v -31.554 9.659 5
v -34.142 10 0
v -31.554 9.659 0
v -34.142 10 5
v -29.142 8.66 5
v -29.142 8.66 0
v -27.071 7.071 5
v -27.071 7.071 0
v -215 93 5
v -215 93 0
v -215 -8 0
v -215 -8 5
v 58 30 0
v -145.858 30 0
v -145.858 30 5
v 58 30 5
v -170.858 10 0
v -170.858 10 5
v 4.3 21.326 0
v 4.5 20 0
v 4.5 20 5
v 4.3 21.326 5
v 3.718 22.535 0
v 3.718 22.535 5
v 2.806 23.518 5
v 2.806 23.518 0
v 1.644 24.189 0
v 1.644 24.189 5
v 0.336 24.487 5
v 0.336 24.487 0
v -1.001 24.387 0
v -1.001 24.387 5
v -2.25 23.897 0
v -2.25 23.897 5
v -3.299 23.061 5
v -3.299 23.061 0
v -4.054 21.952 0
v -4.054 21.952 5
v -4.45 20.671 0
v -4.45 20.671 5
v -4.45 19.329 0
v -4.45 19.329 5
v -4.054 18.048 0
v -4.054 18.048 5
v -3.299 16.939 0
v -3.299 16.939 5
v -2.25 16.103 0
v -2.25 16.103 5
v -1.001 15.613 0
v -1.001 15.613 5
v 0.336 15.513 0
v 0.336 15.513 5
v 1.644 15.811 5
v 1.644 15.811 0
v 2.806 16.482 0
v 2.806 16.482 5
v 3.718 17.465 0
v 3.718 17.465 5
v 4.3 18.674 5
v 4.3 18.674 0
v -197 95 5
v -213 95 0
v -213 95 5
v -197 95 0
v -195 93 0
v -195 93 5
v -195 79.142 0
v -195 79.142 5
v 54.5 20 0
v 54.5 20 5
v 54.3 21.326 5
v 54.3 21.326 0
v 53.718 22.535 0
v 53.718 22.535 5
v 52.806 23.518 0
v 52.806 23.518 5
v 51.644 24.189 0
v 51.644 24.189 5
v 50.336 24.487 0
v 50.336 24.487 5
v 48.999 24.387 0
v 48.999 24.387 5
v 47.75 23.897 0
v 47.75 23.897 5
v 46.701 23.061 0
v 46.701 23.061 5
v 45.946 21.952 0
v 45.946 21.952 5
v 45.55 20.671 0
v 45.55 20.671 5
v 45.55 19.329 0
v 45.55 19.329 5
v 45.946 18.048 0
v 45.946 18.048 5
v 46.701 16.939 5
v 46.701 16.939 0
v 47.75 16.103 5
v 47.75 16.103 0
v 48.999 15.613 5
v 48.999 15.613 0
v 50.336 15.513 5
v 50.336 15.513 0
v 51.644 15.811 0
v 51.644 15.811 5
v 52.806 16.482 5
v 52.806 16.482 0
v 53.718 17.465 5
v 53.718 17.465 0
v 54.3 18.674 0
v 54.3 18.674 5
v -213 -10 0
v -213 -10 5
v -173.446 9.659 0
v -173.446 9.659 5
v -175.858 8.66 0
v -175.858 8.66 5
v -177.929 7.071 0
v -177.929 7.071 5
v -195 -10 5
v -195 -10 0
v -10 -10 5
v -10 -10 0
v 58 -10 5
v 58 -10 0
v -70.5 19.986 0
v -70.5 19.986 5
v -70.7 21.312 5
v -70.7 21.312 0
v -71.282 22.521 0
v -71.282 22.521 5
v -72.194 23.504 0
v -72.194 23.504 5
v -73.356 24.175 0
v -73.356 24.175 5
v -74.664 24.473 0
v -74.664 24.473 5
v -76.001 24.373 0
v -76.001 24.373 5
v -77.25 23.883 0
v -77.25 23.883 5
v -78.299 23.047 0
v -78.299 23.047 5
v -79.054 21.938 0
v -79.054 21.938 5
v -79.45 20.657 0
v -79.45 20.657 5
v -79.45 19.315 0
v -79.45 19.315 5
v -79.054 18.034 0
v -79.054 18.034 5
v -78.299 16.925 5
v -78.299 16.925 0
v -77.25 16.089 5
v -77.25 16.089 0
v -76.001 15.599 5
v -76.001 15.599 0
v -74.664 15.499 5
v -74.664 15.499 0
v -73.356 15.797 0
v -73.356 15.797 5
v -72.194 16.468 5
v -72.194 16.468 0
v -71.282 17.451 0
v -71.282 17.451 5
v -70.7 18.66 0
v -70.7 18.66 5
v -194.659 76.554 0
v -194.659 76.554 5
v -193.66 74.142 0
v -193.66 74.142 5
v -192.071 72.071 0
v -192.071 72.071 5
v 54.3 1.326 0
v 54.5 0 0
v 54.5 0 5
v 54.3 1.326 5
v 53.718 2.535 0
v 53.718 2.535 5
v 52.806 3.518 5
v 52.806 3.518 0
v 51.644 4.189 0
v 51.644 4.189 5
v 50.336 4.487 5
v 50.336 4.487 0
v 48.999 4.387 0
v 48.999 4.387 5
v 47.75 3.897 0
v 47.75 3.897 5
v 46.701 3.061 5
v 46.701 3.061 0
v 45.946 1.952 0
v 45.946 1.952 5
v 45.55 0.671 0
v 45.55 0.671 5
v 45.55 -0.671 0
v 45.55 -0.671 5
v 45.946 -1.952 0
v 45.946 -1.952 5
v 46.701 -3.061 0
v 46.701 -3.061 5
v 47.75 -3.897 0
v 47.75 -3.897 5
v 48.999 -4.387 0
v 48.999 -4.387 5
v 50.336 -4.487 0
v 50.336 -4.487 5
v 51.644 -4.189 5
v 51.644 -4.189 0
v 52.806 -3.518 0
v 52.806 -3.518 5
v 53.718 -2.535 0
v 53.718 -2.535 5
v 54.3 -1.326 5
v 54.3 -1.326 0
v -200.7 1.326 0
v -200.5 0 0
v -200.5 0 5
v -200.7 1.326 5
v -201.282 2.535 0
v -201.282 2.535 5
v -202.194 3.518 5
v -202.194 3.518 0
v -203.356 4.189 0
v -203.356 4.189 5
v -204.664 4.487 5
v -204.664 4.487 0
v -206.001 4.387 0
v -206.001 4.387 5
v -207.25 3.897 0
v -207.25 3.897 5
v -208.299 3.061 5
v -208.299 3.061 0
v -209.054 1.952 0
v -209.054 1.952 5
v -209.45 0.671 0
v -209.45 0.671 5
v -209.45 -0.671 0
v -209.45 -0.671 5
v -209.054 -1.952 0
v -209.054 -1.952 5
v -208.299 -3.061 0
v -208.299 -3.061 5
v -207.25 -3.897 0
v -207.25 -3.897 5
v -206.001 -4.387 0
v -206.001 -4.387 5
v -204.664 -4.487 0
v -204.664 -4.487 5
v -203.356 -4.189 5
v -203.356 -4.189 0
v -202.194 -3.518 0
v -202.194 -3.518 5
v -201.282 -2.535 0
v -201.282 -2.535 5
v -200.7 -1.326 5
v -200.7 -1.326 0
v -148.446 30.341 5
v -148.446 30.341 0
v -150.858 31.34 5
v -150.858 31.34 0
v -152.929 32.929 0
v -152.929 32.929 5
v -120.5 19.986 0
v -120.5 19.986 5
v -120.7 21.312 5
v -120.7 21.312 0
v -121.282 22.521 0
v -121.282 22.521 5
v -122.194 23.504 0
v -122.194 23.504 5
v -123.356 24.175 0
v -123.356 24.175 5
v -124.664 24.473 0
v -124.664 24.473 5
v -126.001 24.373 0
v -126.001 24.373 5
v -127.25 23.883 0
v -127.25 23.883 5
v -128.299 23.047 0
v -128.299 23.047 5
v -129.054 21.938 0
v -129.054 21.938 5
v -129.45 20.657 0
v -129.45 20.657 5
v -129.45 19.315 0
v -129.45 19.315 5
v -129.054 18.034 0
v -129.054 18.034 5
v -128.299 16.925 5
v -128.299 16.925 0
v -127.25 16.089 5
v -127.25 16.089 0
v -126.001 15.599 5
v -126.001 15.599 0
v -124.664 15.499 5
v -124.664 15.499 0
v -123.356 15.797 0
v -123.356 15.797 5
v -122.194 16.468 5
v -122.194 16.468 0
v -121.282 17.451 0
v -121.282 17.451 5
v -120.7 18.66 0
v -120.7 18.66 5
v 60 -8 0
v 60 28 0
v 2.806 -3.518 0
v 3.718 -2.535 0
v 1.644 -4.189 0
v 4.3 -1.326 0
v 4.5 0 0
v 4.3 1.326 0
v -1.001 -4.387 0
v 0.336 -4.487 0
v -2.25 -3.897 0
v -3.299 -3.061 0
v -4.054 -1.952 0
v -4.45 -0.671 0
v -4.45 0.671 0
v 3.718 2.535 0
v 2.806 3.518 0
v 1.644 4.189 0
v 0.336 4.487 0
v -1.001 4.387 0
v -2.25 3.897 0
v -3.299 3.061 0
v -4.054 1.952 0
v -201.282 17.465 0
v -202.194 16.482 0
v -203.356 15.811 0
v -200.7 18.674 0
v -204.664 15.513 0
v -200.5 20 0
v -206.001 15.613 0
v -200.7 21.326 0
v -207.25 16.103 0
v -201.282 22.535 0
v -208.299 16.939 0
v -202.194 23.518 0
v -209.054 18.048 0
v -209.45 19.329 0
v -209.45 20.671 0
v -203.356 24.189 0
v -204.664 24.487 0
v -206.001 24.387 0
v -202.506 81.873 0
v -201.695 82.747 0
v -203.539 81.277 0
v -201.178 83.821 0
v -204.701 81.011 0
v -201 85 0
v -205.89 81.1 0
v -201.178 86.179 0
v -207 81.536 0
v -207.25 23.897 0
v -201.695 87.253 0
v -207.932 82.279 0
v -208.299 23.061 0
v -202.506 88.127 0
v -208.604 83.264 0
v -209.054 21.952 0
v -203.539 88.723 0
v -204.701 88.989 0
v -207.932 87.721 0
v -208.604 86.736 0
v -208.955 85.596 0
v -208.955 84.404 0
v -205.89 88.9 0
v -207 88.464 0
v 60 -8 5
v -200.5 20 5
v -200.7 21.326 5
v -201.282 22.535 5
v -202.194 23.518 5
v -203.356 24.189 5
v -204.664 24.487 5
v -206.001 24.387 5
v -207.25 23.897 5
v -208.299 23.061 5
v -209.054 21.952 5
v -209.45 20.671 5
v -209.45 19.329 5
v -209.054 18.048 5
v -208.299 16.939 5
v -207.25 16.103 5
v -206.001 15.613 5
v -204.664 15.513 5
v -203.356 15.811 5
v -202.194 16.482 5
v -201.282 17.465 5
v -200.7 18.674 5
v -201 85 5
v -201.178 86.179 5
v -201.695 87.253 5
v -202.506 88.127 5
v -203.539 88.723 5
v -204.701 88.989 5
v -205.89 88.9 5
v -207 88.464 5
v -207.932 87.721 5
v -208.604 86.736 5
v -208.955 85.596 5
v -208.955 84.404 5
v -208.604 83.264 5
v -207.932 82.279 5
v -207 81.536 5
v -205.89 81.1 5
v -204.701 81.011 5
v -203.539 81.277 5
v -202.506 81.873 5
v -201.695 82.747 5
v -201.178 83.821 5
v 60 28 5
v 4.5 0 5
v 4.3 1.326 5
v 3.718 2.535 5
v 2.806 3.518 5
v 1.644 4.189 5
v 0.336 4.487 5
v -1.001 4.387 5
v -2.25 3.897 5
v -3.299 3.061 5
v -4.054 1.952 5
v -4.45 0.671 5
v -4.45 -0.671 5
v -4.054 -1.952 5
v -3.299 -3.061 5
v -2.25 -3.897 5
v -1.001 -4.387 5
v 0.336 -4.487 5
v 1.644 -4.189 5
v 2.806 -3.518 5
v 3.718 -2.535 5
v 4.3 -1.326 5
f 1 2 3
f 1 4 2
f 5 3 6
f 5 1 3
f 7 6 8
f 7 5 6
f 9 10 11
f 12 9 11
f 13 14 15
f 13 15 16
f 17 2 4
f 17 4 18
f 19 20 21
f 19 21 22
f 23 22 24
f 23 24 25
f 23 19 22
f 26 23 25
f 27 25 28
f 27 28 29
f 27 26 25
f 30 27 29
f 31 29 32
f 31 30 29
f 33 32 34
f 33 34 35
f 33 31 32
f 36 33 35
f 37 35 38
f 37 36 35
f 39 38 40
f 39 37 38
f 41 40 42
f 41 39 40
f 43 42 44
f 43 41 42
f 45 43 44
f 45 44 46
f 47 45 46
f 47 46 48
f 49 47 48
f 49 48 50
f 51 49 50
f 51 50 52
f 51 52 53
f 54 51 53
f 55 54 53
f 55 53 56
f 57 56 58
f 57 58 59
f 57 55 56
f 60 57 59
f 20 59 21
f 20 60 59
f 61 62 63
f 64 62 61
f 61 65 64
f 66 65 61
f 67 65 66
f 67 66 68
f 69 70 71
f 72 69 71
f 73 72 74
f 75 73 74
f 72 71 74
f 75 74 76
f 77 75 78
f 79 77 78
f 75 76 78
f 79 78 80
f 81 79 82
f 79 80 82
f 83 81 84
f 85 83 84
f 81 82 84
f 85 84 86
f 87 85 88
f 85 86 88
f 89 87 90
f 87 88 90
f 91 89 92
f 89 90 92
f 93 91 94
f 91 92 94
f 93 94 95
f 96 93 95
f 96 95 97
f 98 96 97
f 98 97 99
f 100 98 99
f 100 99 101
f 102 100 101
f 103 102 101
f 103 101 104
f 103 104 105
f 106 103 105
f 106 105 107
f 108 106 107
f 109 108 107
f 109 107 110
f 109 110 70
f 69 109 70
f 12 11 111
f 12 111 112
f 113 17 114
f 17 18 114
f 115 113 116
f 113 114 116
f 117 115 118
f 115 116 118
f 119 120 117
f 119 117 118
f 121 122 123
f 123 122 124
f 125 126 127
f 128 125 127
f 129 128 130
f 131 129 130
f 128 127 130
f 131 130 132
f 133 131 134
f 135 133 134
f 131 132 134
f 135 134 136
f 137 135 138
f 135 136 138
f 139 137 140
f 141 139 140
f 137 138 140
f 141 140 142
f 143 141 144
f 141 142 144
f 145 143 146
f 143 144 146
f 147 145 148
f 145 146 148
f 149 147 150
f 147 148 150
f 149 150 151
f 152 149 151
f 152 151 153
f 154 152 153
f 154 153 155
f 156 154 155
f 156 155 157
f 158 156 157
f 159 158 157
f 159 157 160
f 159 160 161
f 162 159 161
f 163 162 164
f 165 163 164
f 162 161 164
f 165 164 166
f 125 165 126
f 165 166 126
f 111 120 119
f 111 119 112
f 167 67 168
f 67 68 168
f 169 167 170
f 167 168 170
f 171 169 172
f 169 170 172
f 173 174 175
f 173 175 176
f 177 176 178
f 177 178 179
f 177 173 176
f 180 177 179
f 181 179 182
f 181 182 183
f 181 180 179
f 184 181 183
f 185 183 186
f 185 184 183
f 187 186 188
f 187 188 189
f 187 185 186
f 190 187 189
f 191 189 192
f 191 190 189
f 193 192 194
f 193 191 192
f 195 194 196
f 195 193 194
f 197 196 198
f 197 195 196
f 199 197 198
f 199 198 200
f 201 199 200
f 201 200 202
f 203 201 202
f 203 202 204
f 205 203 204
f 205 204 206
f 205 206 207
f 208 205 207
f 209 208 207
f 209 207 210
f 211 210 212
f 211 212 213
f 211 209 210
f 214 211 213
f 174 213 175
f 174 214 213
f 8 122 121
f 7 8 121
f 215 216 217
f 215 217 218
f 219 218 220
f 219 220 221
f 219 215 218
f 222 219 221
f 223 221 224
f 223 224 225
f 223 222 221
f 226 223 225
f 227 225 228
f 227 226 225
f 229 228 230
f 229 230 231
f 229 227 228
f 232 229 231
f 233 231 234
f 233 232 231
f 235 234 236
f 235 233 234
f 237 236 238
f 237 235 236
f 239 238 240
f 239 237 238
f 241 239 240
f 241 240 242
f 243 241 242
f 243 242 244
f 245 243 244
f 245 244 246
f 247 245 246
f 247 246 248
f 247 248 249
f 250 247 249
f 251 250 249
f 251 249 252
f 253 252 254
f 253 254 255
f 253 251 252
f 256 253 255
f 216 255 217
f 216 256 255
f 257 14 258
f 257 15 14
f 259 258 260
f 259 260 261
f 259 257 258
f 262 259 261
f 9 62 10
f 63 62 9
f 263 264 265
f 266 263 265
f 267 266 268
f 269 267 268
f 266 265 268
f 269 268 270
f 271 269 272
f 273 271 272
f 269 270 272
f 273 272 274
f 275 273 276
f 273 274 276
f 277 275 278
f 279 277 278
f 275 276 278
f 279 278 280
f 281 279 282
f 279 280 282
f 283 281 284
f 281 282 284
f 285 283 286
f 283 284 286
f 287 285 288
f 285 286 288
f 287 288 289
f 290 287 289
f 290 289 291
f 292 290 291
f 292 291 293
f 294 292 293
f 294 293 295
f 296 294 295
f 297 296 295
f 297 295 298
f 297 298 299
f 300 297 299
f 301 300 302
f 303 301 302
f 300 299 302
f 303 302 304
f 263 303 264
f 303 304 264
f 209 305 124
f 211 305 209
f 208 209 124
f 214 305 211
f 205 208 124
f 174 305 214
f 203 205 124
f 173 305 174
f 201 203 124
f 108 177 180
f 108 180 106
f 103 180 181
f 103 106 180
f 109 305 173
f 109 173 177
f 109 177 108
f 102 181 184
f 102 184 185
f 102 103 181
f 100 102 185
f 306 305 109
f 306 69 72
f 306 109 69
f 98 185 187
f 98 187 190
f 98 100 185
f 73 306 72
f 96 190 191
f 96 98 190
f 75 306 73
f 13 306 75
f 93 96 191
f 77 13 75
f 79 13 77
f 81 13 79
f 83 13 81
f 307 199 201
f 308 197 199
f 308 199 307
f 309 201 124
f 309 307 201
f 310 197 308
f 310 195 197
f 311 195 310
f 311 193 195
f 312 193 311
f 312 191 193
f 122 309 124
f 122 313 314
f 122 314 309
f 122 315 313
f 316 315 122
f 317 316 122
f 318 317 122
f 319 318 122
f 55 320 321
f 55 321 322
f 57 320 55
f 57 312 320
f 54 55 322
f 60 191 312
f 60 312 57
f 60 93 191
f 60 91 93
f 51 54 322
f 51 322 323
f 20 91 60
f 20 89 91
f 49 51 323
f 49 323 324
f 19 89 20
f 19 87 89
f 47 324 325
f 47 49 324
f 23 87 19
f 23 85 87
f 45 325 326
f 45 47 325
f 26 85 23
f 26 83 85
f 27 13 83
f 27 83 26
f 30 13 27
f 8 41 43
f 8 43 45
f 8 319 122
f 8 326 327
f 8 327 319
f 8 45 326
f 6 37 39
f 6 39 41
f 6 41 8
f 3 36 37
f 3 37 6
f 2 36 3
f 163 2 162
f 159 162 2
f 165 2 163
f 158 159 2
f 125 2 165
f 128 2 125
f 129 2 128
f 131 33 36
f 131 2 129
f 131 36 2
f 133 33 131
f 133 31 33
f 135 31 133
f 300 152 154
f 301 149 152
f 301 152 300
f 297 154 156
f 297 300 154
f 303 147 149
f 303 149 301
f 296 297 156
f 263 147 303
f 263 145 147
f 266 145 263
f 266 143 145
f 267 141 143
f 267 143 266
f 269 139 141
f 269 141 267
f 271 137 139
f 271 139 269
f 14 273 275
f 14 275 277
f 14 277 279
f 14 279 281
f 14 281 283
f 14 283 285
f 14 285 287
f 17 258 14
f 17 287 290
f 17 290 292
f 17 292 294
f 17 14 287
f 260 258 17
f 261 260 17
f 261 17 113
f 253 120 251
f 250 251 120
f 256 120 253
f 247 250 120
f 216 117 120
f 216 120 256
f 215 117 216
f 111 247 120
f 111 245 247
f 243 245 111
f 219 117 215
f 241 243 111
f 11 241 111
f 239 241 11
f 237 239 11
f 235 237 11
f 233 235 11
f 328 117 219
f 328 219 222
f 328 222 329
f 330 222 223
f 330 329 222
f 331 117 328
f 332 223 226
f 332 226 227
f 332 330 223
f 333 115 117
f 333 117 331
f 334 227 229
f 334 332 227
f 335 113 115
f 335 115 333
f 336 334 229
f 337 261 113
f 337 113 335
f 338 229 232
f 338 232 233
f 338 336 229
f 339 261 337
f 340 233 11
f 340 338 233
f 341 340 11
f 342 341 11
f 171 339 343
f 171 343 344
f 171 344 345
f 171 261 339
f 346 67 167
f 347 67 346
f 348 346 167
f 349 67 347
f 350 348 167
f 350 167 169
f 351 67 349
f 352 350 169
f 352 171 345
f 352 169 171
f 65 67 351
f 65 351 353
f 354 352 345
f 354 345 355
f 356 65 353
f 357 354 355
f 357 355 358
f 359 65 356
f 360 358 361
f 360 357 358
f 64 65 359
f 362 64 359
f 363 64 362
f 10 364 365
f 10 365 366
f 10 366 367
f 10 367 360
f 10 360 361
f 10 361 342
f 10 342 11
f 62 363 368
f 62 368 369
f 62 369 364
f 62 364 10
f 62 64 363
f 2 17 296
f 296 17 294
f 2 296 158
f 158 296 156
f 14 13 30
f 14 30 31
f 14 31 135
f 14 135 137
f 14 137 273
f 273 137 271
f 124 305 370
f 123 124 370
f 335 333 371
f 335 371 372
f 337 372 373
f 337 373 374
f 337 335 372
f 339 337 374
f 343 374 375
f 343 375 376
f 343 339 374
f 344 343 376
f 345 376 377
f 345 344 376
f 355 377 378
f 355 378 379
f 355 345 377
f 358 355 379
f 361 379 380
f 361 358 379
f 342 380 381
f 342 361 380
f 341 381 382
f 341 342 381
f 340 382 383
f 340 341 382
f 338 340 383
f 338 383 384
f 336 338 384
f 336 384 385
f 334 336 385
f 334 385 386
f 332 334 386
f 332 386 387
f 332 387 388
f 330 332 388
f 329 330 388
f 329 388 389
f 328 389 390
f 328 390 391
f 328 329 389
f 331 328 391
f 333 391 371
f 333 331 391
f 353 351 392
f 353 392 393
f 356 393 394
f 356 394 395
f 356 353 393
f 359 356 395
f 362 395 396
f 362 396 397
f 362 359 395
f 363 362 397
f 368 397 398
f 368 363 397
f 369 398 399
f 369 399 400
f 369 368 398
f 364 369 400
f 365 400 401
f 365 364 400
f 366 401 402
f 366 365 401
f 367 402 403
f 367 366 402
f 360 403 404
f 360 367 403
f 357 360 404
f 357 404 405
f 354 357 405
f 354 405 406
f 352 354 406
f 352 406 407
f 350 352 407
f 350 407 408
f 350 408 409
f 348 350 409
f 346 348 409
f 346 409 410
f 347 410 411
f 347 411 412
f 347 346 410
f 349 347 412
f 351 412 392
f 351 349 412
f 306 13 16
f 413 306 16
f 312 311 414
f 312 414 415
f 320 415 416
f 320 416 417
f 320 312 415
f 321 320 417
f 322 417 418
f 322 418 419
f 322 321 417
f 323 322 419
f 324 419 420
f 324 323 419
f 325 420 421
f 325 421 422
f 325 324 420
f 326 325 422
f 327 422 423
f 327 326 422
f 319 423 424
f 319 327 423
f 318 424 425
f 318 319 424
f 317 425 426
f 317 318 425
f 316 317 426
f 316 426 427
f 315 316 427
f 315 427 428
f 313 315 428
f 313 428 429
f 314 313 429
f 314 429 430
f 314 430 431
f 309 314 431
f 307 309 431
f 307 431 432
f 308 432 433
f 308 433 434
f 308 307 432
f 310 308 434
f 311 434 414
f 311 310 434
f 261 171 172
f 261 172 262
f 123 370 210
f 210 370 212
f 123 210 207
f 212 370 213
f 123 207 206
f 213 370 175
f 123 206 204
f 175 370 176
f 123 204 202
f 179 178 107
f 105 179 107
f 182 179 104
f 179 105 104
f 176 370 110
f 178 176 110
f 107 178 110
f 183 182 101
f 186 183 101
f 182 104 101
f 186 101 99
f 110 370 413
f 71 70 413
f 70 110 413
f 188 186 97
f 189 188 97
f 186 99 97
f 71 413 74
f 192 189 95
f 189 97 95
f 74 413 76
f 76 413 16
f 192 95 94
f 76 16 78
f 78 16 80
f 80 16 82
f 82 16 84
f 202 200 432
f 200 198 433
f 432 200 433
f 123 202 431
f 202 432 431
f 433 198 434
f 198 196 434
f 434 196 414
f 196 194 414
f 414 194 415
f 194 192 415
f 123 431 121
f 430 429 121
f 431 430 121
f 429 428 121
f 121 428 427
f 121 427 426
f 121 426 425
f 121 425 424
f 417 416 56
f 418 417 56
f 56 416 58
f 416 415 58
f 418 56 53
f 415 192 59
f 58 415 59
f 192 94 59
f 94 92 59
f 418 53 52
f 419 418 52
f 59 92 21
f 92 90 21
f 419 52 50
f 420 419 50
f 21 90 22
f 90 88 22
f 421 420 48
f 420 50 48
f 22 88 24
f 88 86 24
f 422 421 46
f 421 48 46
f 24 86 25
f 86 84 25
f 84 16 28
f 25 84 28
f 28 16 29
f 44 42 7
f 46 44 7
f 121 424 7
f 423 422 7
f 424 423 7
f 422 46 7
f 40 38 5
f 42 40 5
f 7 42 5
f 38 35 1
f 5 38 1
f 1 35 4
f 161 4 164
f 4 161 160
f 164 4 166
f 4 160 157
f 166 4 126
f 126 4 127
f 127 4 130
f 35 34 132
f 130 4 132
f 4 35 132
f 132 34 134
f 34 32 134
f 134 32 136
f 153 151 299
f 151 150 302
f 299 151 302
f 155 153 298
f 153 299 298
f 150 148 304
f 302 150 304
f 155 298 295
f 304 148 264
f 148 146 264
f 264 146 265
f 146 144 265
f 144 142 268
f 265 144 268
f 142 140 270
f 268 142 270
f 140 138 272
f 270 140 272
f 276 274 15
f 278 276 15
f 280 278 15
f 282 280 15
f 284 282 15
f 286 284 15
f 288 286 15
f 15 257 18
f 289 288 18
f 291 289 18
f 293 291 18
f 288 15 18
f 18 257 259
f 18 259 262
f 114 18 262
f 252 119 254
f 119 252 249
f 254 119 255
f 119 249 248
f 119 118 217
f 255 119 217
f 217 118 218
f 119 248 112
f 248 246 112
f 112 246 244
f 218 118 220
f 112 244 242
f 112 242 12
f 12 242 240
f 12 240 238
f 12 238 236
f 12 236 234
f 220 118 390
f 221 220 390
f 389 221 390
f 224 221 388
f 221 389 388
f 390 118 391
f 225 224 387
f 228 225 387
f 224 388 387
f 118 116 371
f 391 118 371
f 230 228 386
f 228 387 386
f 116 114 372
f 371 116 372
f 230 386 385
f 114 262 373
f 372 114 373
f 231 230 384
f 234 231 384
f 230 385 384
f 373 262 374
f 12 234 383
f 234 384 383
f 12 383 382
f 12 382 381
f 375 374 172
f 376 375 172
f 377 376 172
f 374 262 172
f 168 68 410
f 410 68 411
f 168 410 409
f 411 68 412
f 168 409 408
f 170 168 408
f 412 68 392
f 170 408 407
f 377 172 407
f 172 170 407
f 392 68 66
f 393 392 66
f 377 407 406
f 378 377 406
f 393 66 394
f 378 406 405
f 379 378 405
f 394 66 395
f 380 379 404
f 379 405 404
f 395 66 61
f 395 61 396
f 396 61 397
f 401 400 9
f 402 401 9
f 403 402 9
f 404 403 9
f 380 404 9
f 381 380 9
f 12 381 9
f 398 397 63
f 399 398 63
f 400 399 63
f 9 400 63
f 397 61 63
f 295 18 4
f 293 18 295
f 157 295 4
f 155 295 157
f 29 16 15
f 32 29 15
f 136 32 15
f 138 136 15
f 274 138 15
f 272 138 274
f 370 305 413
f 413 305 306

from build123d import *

# Parameters (mm, degrees)
SKETCH_1_R          = 4.5
SKETCH_1_R_2        = 4
EXTRUDE_1_DEPTH     = 5
CHAMFER_2_SIZE      = 20
CHAMFER_3_SIZE      = 20
SKETCH_2_R          = 4.5
CUT_EXTRUDE_1_DEPTH = 5
FILLET_1_R          = 10
CHAMFER_4_SIZE      = 2
SKETCH_3_R          = 4.5
CUT_EXTRUDE_2_DEPTH = 10


with BuildPart() as part:
    # 草图1 → 凸台-拉伸1 (new body)
    with BuildSketch(Plane.XY):
        Polygon((-215, 70), (-215, 75), (-215, 95), (-195, 95), (-195, 75), (-150, 30), (60, 30), (60, 10), (60, -10), (40, -10), (10, -10), (-10, -10), (-10, 10), (-195, 10), (-195, -10), (-215, -10), (-215, 10), align=None)
        Circle(SKETCH_1_R, mode=Mode.SUBTRACT)
        with Locations((50, 0)):
            Circle(SKETCH_1_R, mode=Mode.SUBTRACT)
        with Locations((-205, 20)):
            Circle(SKETCH_1_R, mode=Mode.SUBTRACT)
        with Locations((0, 20)):
            Circle(SKETCH_1_R, mode=Mode.SUBTRACT)
        with Locations((-205, 0)):
            Circle(SKETCH_1_R, mode=Mode.SUBTRACT)
        with Locations((-205, 85)):
            Circle(SKETCH_1_R_2, mode=Mode.SUBTRACT)
    extrude(amount=EXTRUDE_1_DEPTH)

    # 倒角2
    chamfer_2_edges = [part.edges().sort_by_distance(p)[0] for p in [
        (-10, 10, 2.5),
    ]]
    chamfer(chamfer_2_edges, length=CHAMFER_2_SIZE - 0.0001)  # a hair under: the kernel refuses the full size

    # 倒角3
    chamfer_3_edges = [part.edges().sort_by_distance(p)[0] for p in [
        (-195, 10, 2.5),
    ]]
    chamfer(chamfer_3_edges, length=CHAMFER_3_SIZE - 0.0001)  # a hair under: the kernel refuses the full size

    # 草图2 → 切除-拉伸1 (cut)
    with BuildSketch(Plane.XY.offset(5)):
        with Locations((-125, 19.986)):
            Circle(SKETCH_2_R)
        with Locations((-75, 19.986)):
            Circle(SKETCH_2_R)
    extrude(amount=-CUT_EXTRUDE_1_DEPTH, mode=Mode.SUBTRACT)

    # 圆角1
    fillet_1_edges = [part.edges().sort_by_distance(p)[0] for p in [
        (-195, 75, 2.5),
        (-150, 30, 2.5),
        (-29.9999, 10, 2.5),
        (-175.0001, 10, 2.5),
    ]]
    fillet(fillet_1_edges, radius=FILLET_1_R)

    # 倒角4
    chamfer_4_edges = [part.edges().sort_by_distance(p)[0] for p in [
        (60, 30, 2.5),
        (60, -10, 2.5),
        (-215, -10, 2.5),
        (-215, 95, 2.5),
        (-195, 95, 2.5),
    ]]
    chamfer(chamfer_4_edges, length=CHAMFER_4_SIZE)

    # 草图3 → 切除-拉伸2 (cut)
    with BuildSketch(Plane.XY.offset(5)):
        with Locations((50, 20)):
            Circle(SKETCH_3_R)
    extrude(amount=-CUT_EXTRUDE_2_DEPTH, mode=Mode.SUBTRACT)


solid = part.part
